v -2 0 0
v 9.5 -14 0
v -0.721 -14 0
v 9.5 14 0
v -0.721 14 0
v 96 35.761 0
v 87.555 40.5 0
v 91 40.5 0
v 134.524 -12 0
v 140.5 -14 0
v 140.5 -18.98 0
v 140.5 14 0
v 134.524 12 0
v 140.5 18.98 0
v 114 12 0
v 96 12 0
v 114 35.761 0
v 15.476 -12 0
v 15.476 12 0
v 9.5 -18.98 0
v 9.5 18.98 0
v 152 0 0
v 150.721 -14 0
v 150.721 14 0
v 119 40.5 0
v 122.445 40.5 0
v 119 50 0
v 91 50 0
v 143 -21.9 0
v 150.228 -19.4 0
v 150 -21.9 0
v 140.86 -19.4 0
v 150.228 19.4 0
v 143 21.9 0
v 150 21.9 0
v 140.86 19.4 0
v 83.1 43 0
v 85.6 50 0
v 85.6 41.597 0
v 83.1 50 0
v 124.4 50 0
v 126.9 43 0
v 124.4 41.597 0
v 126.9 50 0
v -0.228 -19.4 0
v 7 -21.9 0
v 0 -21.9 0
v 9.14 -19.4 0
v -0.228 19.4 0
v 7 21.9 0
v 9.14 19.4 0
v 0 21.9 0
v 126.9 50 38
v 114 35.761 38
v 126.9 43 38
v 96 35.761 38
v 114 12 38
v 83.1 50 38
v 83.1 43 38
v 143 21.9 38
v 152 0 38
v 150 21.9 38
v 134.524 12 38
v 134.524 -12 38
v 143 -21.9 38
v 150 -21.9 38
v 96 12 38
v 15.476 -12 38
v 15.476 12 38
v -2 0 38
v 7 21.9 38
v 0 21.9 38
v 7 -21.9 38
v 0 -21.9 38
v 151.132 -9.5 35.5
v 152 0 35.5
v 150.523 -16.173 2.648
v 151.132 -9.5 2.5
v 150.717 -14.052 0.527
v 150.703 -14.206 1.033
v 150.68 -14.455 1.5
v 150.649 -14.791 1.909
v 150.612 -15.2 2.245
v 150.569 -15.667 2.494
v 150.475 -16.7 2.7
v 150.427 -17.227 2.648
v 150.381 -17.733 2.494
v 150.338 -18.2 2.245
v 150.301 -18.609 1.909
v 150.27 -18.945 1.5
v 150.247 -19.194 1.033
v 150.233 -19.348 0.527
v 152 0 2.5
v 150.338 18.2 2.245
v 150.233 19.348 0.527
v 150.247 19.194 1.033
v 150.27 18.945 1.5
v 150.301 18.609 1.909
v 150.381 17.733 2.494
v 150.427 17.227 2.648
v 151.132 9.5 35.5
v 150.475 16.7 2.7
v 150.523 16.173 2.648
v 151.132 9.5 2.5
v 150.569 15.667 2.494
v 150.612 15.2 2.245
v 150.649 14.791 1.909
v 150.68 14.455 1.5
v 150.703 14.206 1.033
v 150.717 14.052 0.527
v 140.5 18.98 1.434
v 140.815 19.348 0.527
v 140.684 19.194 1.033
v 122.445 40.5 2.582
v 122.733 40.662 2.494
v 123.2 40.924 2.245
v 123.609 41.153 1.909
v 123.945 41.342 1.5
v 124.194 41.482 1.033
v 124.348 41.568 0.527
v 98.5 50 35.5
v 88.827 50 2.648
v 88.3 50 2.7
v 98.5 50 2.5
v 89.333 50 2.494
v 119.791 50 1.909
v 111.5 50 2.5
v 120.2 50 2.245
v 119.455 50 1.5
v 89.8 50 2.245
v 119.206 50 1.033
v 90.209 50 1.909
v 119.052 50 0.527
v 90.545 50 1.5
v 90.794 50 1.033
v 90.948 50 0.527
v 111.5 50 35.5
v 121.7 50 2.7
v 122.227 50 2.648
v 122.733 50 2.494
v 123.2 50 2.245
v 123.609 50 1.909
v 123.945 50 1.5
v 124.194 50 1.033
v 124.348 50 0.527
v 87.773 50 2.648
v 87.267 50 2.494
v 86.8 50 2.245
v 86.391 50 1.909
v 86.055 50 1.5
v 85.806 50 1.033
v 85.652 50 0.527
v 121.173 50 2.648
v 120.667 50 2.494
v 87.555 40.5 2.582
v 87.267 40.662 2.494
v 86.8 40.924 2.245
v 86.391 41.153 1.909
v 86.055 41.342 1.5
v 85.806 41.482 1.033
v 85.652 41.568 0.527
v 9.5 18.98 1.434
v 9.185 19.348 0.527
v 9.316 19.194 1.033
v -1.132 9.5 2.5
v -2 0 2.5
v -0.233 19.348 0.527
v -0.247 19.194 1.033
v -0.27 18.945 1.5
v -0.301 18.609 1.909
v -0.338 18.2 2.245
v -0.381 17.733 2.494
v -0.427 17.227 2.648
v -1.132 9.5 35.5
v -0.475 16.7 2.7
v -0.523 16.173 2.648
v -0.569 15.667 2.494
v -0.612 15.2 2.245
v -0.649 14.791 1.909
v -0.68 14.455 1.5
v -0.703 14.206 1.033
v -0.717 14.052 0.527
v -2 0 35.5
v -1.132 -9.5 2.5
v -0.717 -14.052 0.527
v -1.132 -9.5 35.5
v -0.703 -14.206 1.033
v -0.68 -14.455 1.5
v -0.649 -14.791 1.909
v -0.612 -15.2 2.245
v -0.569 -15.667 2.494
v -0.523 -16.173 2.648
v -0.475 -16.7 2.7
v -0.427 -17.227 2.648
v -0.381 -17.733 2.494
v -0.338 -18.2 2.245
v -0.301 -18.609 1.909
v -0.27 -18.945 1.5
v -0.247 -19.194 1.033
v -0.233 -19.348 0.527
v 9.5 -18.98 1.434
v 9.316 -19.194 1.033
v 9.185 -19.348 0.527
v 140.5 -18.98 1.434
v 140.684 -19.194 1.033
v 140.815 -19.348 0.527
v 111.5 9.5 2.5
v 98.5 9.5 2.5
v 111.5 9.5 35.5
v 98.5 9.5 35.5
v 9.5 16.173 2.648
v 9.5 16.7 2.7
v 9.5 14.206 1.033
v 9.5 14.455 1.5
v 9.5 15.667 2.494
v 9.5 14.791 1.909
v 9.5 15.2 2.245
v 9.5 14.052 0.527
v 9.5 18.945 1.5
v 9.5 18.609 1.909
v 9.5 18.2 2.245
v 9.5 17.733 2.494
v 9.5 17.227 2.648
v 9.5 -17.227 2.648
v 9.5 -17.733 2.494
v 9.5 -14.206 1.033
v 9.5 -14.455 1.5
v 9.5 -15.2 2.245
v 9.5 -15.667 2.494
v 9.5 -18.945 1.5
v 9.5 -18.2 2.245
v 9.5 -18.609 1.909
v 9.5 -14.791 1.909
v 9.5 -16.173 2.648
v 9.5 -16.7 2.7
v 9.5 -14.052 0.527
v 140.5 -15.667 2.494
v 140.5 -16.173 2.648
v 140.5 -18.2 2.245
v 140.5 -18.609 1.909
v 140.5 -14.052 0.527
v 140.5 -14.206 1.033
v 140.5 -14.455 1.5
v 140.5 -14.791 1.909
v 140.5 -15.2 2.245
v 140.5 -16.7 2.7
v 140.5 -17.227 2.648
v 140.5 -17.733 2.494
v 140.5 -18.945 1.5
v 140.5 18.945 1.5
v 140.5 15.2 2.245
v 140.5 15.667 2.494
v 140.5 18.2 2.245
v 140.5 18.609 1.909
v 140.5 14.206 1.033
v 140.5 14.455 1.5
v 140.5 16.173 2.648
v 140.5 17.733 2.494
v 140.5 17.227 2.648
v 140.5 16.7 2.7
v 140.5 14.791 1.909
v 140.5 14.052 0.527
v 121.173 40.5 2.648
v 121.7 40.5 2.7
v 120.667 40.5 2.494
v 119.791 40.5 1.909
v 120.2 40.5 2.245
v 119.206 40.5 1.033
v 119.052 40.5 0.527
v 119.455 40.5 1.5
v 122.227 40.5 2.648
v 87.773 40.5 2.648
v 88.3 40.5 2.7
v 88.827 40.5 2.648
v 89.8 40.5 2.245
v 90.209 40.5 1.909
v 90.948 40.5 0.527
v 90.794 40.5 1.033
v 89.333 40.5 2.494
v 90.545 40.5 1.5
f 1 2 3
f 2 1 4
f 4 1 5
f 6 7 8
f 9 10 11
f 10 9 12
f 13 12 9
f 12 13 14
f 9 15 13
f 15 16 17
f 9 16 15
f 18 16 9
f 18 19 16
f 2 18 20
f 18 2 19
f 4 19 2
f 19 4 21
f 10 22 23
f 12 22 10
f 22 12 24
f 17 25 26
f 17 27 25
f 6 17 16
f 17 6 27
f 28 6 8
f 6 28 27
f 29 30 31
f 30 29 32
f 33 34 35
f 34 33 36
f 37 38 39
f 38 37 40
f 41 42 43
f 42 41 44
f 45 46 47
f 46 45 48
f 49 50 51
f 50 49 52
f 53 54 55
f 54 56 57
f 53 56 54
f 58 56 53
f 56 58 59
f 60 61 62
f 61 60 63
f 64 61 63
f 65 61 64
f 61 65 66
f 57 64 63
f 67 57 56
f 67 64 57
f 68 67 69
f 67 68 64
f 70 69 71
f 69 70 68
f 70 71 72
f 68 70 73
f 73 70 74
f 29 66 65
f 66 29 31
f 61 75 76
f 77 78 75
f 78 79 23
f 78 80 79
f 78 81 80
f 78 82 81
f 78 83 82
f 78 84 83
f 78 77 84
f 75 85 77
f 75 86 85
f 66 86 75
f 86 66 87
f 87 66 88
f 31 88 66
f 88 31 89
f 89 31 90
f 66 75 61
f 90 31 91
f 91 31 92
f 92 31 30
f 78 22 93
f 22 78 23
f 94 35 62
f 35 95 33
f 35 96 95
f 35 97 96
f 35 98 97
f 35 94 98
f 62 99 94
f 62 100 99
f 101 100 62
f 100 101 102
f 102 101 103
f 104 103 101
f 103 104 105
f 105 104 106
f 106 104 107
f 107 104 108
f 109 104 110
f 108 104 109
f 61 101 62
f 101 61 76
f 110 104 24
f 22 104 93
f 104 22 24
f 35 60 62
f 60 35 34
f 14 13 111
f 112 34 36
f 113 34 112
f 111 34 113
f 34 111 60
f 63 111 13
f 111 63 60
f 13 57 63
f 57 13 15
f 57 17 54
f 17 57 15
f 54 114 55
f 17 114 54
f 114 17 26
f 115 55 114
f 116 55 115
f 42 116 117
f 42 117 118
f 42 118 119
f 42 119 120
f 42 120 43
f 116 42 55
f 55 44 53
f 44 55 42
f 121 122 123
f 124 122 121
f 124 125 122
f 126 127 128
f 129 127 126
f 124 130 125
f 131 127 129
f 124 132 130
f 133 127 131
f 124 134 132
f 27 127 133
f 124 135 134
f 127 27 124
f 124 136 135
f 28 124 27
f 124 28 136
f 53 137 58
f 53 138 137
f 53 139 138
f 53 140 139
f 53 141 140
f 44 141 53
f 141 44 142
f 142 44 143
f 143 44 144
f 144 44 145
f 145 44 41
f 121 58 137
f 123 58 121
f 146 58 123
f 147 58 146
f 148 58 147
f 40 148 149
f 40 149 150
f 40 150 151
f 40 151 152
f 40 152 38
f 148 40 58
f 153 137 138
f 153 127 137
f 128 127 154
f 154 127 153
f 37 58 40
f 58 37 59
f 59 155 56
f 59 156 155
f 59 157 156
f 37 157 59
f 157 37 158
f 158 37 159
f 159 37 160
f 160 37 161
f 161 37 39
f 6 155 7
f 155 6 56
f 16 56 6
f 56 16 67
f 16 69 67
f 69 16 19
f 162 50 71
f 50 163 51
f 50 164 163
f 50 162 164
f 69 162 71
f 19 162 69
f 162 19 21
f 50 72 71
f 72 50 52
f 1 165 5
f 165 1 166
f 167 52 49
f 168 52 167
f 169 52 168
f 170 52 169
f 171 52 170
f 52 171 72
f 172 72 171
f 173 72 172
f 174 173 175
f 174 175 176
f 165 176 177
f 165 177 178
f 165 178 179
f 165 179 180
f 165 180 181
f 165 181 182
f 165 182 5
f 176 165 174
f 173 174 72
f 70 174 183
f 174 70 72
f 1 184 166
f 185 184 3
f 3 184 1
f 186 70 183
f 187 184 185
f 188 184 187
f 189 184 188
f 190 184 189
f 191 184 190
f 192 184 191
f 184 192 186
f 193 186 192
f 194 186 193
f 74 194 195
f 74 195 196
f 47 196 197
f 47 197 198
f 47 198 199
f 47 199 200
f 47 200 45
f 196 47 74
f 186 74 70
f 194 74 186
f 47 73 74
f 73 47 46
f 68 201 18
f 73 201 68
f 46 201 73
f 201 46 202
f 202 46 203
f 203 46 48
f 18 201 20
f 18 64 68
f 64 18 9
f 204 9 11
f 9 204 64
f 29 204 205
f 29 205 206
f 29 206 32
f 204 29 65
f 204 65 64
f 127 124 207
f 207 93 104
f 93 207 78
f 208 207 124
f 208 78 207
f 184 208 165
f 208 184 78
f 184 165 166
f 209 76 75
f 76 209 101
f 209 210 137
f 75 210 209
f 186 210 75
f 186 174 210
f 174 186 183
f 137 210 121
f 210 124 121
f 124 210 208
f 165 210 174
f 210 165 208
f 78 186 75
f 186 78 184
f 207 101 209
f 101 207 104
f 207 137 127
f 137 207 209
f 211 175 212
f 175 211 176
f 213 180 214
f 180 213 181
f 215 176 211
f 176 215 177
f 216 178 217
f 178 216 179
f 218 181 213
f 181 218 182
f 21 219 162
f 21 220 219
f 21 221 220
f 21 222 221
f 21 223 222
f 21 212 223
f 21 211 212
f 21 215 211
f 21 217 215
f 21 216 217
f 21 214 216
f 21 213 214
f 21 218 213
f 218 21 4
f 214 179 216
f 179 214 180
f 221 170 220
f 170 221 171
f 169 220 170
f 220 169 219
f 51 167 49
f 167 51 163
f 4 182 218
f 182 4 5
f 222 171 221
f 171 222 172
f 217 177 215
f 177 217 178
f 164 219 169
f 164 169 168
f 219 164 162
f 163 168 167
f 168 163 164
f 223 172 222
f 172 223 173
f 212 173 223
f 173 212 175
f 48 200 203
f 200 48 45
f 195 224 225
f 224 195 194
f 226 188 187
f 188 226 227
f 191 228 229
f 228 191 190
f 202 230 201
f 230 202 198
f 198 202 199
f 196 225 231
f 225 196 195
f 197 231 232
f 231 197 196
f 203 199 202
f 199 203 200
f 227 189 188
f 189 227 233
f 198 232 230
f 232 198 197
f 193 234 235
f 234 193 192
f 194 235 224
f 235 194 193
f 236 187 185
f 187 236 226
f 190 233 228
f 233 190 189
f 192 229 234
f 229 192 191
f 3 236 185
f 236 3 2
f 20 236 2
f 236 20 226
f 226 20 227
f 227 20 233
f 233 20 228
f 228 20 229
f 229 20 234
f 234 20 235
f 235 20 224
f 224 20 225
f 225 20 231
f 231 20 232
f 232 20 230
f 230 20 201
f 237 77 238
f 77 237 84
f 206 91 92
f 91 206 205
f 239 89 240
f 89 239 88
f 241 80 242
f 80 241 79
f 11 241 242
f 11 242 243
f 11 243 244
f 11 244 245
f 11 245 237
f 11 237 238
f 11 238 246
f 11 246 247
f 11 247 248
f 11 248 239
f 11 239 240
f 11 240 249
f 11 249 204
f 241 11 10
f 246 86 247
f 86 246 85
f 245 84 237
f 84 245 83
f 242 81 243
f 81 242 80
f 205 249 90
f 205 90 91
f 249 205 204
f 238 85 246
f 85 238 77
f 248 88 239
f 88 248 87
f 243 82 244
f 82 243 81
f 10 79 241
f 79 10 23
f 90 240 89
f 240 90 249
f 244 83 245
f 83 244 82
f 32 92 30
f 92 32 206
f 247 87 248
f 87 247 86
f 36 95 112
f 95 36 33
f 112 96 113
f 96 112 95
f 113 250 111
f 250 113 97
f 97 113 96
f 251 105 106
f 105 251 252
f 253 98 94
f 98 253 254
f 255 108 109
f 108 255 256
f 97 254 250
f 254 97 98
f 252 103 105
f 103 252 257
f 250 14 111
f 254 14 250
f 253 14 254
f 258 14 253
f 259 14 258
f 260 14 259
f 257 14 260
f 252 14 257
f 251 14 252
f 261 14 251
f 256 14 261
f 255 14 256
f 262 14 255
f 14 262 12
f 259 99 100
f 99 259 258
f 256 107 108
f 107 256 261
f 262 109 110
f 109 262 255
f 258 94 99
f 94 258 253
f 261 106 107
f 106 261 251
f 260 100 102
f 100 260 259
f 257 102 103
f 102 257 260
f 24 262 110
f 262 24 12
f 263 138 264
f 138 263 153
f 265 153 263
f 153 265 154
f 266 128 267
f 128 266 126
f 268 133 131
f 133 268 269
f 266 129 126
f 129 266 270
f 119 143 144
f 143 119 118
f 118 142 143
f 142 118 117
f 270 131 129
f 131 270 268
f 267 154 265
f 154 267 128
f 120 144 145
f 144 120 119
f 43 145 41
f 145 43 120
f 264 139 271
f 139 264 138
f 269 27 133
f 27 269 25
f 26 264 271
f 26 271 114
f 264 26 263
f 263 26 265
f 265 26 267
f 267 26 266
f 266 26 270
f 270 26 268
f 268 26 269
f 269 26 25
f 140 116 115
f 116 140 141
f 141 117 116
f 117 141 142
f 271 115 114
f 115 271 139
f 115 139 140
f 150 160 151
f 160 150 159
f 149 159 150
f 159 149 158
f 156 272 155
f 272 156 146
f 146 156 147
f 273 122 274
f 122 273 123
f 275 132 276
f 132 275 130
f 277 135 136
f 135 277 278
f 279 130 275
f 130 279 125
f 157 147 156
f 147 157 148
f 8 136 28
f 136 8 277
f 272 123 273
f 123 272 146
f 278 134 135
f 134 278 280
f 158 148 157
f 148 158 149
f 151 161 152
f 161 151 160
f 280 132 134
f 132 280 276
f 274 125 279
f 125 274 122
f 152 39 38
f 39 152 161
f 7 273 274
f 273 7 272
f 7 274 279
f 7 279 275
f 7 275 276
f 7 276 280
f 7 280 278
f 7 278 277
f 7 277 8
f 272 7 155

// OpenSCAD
$fn = 32;

// ----------------------------------------------------------------------
// Air duct: 24 mm duct, 2.5 mm wall, 38 mm across
// ----------------------------------------------------------------------

// --- parameters (mm) ---
duct_r = 12;              // duct core radius
duct_d = 24;              // duct core diameter
wall = 2.5;               // duct wall thickness
height = 38;              // duct width (extrusion height)
port_r = 21.9;            // port flange half width
port_d = 43.8;            // port flange width
port_t = 7;               // port flange thickness
bolt_d = 5.4;             // port bolt holes
bolt_offset = 16.7;       // bolt hole offset from the port axis
branch_r = 9;             // branch core radius
branch_d = 18;            // branch core diameter
branch_len = 50;          // branch length from the run axis

difference() {
  /* outer hull chain: tube with a flat flange plate at every port */
  linear_extrude(height = 38) {
    hull() {
      polygon([[0, -21.9], [0, 21.9], [7, 21.9], [7, -21.9]]);
      translate([10, 0]) circle(r = 12);
    }
    hull() {
      translate([10, 0]) circle(r = 12);
      translate([45, 0]) circle(r = 12);
    }
    hull() {
      translate([45, 0]) circle(r = 12);
      translate([105, 0]) circle(r = 12);
    }
    hull() {
      translate([105, 0]) circle(r = 12);
      translate([140, 0]) circle(r = 12);
    }
    hull() {
      translate([140, 0]) circle(r = 12);
      polygon([[150, 21.9], [150, -21.9], [143, -21.9], [143, 21.9]]);
    }
    hull() {
      translate([105, 0]) circle(r = 9);
      translate([105, 27.5]) circle(r = 9);
    }
    hull() {
      translate([105, 27.5]) circle(r = 9);
      translate([105, 41]) circle(r = 9);
    }
    hull() {
      translate([105, 41]) circle(r = 9);
      polygon([[83.1, 50], [126.9, 50], [126.9, 43], [83.1, 43]]);
    }
  }
  /* air passage: the same chain inset by the wall, 5 mm proud of the ports */
  translate([0, 0, 2.5]) linear_extrude(height = 33) {
    hull() {
      translate([-5, 0]) circle(r = 9.5);
      translate([45, 0]) circle(r = 9.5);
    }
    hull() {
      translate([45, 0]) circle(r = 9.5);
      translate([105, 0]) circle(r = 9.5);
    }
    hull() {
      translate([105, 0]) circle(r = 9.5);
      translate([155, 0]) circle(r = 9.5);
    }
    hull() {
      translate([105, 0]) circle(r = 6.5);
      translate([105, 27.5]) circle(r = 6.5);
    }
    hull() {
      translate([105, 27.5]) circle(r = 6.5);
      translate([105, 55]) circle(r = 6.5);
    }
  }
  translate([0, 0]) rotate([0, 0, -90]) translate([-16.7, -2.5]) rotate([-90, 0, 0]) cylinder(h = 12, d = 5.4);
  translate([0, 0]) rotate([0, 0, -90]) translate([16.7, -2.5]) rotate([-90, 0, 0]) cylinder(h = 12, d = 5.4);
  translate([150, 0]) rotate([0, 0, 90]) translate([-16.7, -2.5]) rotate([-90, 0, 0]) cylinder(h = 12, d = 5.4);
  translate([150, 0]) rotate([0, 0, 90]) translate([16.7, -2.5]) rotate([-90, 0, 0]) cylinder(h = 12, d = 5.4);
  translate([105, 50]) rotate([0, 0, 180]) translate([-16.7, -2.5]) rotate([-90, 0, 0]) cylinder(h = 12, d = 5.4);
  translate([105, 50]) rotate([0, 0, 180]) translate([16.7, -2.5]) rotate([-90, 0, 0]) cylinder(h = 12, d = 5.4);
}
